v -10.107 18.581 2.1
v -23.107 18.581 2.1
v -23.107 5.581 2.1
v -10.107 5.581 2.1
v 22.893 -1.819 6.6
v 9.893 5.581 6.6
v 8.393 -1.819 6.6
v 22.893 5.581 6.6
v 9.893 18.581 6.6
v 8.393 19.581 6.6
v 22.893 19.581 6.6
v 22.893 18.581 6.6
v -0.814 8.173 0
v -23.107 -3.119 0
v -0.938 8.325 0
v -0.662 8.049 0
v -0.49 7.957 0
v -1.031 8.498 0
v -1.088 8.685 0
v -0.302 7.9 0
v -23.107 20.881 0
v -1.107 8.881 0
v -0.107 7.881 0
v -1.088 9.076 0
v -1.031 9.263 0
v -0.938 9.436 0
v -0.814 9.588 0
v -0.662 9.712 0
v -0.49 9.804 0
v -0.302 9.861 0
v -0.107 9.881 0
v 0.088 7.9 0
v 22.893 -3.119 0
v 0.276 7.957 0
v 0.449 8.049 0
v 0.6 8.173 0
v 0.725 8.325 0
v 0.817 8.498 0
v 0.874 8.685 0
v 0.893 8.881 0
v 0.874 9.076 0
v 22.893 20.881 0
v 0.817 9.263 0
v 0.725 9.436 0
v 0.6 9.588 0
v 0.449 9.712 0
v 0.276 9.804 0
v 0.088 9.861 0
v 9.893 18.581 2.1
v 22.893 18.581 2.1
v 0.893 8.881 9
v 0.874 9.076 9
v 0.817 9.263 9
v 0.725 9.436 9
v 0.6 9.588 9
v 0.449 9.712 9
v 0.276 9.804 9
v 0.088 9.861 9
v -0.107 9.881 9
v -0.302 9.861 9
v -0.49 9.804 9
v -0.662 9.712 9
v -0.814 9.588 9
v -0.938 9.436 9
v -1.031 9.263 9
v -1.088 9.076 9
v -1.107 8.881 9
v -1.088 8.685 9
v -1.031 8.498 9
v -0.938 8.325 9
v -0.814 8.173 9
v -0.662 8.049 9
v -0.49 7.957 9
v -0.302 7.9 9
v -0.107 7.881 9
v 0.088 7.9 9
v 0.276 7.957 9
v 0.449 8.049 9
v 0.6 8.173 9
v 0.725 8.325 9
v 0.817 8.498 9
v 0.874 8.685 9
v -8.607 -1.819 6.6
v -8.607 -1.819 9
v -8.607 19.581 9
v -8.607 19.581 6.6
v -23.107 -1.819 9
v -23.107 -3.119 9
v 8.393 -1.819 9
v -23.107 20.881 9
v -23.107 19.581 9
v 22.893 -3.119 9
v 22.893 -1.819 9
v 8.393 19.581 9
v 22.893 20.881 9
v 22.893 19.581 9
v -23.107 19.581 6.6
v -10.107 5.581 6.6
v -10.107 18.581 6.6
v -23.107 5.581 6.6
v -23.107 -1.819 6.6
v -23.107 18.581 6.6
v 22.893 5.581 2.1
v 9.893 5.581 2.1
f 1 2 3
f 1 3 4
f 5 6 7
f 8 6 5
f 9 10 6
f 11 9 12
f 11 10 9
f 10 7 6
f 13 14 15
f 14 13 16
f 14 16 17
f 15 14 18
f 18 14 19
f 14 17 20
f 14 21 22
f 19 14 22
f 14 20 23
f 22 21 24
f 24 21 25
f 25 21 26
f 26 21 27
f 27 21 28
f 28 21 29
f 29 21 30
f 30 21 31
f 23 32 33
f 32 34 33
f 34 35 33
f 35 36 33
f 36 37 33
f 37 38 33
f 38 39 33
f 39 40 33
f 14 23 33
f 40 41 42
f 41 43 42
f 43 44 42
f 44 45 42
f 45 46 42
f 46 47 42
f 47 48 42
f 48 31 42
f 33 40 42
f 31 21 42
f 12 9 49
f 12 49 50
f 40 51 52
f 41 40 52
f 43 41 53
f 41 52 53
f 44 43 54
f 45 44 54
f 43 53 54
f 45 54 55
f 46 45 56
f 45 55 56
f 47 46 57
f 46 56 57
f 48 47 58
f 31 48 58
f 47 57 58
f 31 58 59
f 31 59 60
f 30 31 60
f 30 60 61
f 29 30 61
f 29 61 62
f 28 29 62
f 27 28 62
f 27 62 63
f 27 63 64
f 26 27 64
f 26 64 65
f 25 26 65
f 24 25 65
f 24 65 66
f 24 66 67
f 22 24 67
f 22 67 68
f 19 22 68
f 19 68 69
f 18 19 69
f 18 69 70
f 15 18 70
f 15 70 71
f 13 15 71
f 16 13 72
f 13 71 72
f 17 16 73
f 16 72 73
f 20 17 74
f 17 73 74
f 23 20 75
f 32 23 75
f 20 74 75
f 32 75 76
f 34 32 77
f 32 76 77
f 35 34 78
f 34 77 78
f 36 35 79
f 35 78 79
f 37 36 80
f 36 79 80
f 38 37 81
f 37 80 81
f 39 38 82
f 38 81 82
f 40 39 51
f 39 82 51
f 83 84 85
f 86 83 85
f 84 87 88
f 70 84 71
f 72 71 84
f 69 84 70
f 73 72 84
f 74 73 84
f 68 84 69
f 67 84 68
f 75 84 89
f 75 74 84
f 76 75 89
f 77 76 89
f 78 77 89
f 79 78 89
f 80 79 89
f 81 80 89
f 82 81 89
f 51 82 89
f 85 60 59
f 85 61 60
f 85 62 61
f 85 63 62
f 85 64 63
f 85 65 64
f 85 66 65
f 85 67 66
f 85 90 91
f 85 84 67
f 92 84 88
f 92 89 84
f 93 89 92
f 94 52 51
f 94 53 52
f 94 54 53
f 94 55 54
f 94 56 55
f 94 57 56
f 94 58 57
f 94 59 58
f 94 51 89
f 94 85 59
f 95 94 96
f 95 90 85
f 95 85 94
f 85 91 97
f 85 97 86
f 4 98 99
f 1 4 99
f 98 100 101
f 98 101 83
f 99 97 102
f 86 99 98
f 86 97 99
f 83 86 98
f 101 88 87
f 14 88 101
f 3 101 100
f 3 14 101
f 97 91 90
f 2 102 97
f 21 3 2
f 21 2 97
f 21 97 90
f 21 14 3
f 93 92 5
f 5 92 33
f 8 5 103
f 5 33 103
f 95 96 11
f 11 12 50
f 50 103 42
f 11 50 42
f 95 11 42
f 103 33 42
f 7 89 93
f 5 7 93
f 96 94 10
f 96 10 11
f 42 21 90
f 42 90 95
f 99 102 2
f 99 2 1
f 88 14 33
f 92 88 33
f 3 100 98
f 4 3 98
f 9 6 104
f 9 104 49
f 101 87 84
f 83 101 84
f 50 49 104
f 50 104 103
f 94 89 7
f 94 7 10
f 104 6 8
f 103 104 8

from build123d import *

# Parameters (mm, degrees)
ESQUISSE1_W             = 46
ESQUISSE1_H             = 24
BOSS_EXTRU_1_DEPTH      = 9
ESQUISSE2_R             = 1
ENL_V_MAT_EXTRU_1_DEPTH = 19
ESQUISSE3_W             = 15.6
ESQUISSE3_H             = 21.4
ENL_V_MAT_EXTRU_2_DEPTH = 2.4
ESQUISSE4_W             = 14
ESQUISSE4_H             = 13
ENL_V_MAT_EXTRU_3_DEPTH = 4.5


with BuildPart() as part:
    # Esquisse1 → Boss.-Extru.1 (new body)
    with BuildSketch(Plane.XY):
        with Locations((-0.106918239, 8.880503145)):
            Rectangle(ESQUISSE1_W, ESQUISSE1_H)
    extrude(amount=BOSS_EXTRU_1_DEPTH)

    # Esquisse2 → Enlèv. mat.-Extru.1 (cut)
    with BuildSketch(Plane.XY.offset(9)):
        with Locations((-0.106918239, 8.880503145)):
            Circle(ESQUISSE2_R)
    extrude(amount=-ENL_V_MAT_EXTRU_1_DEPTH, mode=Mode.SUBTRACT)

    # Esquisse3 → Enlèv. mat.-Extru.2 (cut)
    with BuildSketch(Plane.XY.offset(9)):
        with Locations((-16.406918239, 8.880503145)):
            Rectangle(ESQUISSE3_W, ESQUISSE3_H)
        with Locations((16.193081761, 8.880503145)):
            Rectangle(ESQUISSE3_W, ESQUISSE3_H)
    extrude(amount=-ENL_V_MAT_EXTRU_2_DEPTH, mode=Mode.SUBTRACT)

    # Esquisse4 → Enlèv. mat.-Extru.3 (cut)
    with BuildSketch(Plane.XY.offset(6.6)):
        with Locations((-17.106918239, 12.080503145)):
            Rectangle(ESQUISSE4_W, ESQUISSE4_H)
        with Locations((16.893081761, 12.080503145)):
            Rectangle(ESQUISSE4_W, ESQUISSE4_H)
    extrude(amount=-ENL_V_MAT_EXTRU_3_DEPTH, mode=Mode.SUBTRACT)


solid = part.part
